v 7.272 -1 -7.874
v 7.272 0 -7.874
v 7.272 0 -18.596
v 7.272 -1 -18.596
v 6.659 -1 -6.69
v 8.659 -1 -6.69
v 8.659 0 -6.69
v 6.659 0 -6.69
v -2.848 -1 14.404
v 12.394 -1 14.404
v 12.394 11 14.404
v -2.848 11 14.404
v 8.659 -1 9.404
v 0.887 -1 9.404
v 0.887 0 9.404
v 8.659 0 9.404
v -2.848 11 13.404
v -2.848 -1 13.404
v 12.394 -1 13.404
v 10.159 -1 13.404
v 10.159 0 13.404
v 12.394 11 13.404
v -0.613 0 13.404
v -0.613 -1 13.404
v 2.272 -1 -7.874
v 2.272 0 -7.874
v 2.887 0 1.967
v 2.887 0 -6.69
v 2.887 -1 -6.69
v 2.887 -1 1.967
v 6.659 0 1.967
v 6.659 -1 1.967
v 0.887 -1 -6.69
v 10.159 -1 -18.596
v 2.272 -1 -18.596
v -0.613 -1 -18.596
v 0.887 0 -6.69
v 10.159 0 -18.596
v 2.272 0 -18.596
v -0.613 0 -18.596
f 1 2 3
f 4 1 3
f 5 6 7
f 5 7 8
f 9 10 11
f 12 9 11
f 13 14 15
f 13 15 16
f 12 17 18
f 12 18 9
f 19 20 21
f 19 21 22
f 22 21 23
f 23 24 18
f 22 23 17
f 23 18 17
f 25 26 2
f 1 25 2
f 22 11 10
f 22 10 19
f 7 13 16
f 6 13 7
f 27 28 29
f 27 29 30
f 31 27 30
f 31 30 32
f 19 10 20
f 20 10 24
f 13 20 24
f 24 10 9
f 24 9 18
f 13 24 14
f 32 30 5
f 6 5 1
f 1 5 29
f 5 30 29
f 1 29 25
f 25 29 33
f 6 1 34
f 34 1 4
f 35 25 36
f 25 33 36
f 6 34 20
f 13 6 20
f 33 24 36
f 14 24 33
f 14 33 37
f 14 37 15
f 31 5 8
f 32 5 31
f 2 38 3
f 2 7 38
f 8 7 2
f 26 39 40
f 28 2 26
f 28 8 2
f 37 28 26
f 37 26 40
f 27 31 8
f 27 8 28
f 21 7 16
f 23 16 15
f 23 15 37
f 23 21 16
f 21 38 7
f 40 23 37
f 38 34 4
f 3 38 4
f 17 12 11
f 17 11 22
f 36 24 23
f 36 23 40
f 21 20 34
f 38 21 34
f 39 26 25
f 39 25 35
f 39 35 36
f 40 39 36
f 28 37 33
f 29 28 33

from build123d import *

# Parameters (mm, degrees)
BOSS_EXTRUDE1_DEPTH = 5.772427301
SKETCH2_W           = 10.772427301
SKETCH2_H           = 33
BOSS_EXTRUDE2_DEPTH = 1
CUT_EXTRUDE1_DEPTH  = 2
SKETCH16_W          = 10.772427301
SKETCH16_H          = 1
BOSS_EXTRUDE4_DEPTH = 11
CUT_EXTRUDE2_REACH  = 24.797
SKETCH26_W          = 5
SKETCH26_H          = 10.722198916
CUT_EXTRUDE3_DEPTH  = 24.875254024
SKETCH13_W          = 3.772427301
SKETCH13_H          = 2.348567359
CUT_EXTRUDE4_DEPTH  = 1
SKETCH27_W          = 1
SKETCH27_H          = 12
BOSS_EXTRUDE5_DEPTH = 2.235
SKETCH28_W          = 1
SKETCH28_H          = 12
BOSS_EXTRUDE6_DEPTH = 2.235


with BuildPart() as part:
    # Sketch1 → Boss-Extrude1 (new body)
    with BuildSketch(Plane(origin=(6.659481674, 0, 0), x_dir=(0, 0, -1), z_dir=(1, 0, 0))):
        Polygon((-2.250948222, -1), (-2.966896165, -1), (-2.966896165, -2.348567359), align=None)
    extrude(amount=-BOSS_EXTRUDE1_DEPTH)

    # Sketch2 → Boss-Extrude2 (add)
    with BuildSketch(Plane(origin=(0, -1, 0), x_dir=(-1, 0, 0), z_dir=(0, 1, 0))):
        with Locations((-4.773268024, -2.096039546)):
            Rectangle(SKETCH2_W, SKETCH2_H)
        Polygon((-0.887054373, 2.966896165), (-0.887054373, 9.403960454), (-8.659481674, 9.403960454), (-8.659481674, -6.69042347), (-6.659481674, -6.69042347), (-6.659481674, 2.966896165), align=None, mode=Mode.SUBTRACT)
    extrude(amount=BOSS_EXTRUDE2_DEPTH)

    # Sketch7 → Cut-Extrude1 (cut)
    with BuildSketch(Plane.ZY.offset(-0.887054373)):
        Polygon((2.250948222, -1), (2.966896165, -2.348567359), (2.966896165, 0), (-6.69042347, 0), (-6.69042347, -1), align=None)
    extrude(amount=-CUT_EXTRUDE1_DEPTH, mode=Mode.SUBTRACT)

    # Sketch16 → Boss-Extrude4 (add)
    with BuildSketch(Plane(origin=(0, 0, 0), x_dir=(1, 0, 0), z_dir=(0, 1, 0))):
        with Locations((4.773268024, -13.903960454)):
            Rectangle(SKETCH16_W, SKETCH16_H)
    extrude(amount=BOSS_EXTRUDE4_DEPTH)

    # Sketch23 → Cut-Extrude2 (cut, up to next)
    with BuildSketch(Plane.ZY.offset(-2.887054373), mode=Mode.PRIVATE) as cut_extrude2_sk1:
        Polygon((2.250948222, 0), (2.250948222, -0.125928185), (3.122325521, -1.835650648), (3.712956794, -1.835650648), (3.712956794, 0), align=None)
    cut_extrude2_tool1 = extrude(cut_extrude2_sk1.sketch, amount=-CUT_EXTRUDE2_REACH, mode=Mode.PRIVATE) & part.part
    add(cut_extrude2_tool1.solids().sort_by_distance((2.887054, -0.784154, 3.151212))[0], mode=Mode.SUBTRACT)

    # Sketch26 → Cut-Extrude3 (cut, through all)
    with BuildSketch(Plane(origin=(0, 0, 0), x_dir=(1, 0, 0), z_dir=(0, 1, 0))):
        with Locations((4.772054373, 13.234940088)):
            Rectangle(SKETCH26_W, SKETCH26_H)
    extrude(amount=-CUT_EXTRUDE3_DEPTH, mode=Mode.SUBTRACT)

    # Sketch13 → Cut-Extrude4 (cut)
    with BuildSketch(Plane.XY.offset(2.966896165)):
        with Locations((4.773268024, -1.17428368)):
            Rectangle(SKETCH13_W, SKETCH13_H)
    extrude(amount=-CUT_EXTRUDE4_DEPTH, mode=Mode.SUBTRACT)

    # Sketch27 → Boss-Extrude5 (add)
    with BuildSketch(Plane.ZY.offset(0.612945627)):
        with Locations((13.903960454, 5)):
            Rectangle(SKETCH27_W, SKETCH27_H)
    extrude(amount=BOSS_EXTRUDE5_DEPTH)

    # Sketch28 → Boss-Extrude6 (add)
    with BuildSketch(Plane(origin=(10.159481674, 0, 0), x_dir=(0, 0, -1), z_dir=(1, 0, 0))):
        with Locations((-13.903960454, 5)):
            Rectangle(SKETCH28_W, SKETCH28_H)
    extrude(amount=BOSS_EXTRUDE6_DEPTH)


solid = part.part
